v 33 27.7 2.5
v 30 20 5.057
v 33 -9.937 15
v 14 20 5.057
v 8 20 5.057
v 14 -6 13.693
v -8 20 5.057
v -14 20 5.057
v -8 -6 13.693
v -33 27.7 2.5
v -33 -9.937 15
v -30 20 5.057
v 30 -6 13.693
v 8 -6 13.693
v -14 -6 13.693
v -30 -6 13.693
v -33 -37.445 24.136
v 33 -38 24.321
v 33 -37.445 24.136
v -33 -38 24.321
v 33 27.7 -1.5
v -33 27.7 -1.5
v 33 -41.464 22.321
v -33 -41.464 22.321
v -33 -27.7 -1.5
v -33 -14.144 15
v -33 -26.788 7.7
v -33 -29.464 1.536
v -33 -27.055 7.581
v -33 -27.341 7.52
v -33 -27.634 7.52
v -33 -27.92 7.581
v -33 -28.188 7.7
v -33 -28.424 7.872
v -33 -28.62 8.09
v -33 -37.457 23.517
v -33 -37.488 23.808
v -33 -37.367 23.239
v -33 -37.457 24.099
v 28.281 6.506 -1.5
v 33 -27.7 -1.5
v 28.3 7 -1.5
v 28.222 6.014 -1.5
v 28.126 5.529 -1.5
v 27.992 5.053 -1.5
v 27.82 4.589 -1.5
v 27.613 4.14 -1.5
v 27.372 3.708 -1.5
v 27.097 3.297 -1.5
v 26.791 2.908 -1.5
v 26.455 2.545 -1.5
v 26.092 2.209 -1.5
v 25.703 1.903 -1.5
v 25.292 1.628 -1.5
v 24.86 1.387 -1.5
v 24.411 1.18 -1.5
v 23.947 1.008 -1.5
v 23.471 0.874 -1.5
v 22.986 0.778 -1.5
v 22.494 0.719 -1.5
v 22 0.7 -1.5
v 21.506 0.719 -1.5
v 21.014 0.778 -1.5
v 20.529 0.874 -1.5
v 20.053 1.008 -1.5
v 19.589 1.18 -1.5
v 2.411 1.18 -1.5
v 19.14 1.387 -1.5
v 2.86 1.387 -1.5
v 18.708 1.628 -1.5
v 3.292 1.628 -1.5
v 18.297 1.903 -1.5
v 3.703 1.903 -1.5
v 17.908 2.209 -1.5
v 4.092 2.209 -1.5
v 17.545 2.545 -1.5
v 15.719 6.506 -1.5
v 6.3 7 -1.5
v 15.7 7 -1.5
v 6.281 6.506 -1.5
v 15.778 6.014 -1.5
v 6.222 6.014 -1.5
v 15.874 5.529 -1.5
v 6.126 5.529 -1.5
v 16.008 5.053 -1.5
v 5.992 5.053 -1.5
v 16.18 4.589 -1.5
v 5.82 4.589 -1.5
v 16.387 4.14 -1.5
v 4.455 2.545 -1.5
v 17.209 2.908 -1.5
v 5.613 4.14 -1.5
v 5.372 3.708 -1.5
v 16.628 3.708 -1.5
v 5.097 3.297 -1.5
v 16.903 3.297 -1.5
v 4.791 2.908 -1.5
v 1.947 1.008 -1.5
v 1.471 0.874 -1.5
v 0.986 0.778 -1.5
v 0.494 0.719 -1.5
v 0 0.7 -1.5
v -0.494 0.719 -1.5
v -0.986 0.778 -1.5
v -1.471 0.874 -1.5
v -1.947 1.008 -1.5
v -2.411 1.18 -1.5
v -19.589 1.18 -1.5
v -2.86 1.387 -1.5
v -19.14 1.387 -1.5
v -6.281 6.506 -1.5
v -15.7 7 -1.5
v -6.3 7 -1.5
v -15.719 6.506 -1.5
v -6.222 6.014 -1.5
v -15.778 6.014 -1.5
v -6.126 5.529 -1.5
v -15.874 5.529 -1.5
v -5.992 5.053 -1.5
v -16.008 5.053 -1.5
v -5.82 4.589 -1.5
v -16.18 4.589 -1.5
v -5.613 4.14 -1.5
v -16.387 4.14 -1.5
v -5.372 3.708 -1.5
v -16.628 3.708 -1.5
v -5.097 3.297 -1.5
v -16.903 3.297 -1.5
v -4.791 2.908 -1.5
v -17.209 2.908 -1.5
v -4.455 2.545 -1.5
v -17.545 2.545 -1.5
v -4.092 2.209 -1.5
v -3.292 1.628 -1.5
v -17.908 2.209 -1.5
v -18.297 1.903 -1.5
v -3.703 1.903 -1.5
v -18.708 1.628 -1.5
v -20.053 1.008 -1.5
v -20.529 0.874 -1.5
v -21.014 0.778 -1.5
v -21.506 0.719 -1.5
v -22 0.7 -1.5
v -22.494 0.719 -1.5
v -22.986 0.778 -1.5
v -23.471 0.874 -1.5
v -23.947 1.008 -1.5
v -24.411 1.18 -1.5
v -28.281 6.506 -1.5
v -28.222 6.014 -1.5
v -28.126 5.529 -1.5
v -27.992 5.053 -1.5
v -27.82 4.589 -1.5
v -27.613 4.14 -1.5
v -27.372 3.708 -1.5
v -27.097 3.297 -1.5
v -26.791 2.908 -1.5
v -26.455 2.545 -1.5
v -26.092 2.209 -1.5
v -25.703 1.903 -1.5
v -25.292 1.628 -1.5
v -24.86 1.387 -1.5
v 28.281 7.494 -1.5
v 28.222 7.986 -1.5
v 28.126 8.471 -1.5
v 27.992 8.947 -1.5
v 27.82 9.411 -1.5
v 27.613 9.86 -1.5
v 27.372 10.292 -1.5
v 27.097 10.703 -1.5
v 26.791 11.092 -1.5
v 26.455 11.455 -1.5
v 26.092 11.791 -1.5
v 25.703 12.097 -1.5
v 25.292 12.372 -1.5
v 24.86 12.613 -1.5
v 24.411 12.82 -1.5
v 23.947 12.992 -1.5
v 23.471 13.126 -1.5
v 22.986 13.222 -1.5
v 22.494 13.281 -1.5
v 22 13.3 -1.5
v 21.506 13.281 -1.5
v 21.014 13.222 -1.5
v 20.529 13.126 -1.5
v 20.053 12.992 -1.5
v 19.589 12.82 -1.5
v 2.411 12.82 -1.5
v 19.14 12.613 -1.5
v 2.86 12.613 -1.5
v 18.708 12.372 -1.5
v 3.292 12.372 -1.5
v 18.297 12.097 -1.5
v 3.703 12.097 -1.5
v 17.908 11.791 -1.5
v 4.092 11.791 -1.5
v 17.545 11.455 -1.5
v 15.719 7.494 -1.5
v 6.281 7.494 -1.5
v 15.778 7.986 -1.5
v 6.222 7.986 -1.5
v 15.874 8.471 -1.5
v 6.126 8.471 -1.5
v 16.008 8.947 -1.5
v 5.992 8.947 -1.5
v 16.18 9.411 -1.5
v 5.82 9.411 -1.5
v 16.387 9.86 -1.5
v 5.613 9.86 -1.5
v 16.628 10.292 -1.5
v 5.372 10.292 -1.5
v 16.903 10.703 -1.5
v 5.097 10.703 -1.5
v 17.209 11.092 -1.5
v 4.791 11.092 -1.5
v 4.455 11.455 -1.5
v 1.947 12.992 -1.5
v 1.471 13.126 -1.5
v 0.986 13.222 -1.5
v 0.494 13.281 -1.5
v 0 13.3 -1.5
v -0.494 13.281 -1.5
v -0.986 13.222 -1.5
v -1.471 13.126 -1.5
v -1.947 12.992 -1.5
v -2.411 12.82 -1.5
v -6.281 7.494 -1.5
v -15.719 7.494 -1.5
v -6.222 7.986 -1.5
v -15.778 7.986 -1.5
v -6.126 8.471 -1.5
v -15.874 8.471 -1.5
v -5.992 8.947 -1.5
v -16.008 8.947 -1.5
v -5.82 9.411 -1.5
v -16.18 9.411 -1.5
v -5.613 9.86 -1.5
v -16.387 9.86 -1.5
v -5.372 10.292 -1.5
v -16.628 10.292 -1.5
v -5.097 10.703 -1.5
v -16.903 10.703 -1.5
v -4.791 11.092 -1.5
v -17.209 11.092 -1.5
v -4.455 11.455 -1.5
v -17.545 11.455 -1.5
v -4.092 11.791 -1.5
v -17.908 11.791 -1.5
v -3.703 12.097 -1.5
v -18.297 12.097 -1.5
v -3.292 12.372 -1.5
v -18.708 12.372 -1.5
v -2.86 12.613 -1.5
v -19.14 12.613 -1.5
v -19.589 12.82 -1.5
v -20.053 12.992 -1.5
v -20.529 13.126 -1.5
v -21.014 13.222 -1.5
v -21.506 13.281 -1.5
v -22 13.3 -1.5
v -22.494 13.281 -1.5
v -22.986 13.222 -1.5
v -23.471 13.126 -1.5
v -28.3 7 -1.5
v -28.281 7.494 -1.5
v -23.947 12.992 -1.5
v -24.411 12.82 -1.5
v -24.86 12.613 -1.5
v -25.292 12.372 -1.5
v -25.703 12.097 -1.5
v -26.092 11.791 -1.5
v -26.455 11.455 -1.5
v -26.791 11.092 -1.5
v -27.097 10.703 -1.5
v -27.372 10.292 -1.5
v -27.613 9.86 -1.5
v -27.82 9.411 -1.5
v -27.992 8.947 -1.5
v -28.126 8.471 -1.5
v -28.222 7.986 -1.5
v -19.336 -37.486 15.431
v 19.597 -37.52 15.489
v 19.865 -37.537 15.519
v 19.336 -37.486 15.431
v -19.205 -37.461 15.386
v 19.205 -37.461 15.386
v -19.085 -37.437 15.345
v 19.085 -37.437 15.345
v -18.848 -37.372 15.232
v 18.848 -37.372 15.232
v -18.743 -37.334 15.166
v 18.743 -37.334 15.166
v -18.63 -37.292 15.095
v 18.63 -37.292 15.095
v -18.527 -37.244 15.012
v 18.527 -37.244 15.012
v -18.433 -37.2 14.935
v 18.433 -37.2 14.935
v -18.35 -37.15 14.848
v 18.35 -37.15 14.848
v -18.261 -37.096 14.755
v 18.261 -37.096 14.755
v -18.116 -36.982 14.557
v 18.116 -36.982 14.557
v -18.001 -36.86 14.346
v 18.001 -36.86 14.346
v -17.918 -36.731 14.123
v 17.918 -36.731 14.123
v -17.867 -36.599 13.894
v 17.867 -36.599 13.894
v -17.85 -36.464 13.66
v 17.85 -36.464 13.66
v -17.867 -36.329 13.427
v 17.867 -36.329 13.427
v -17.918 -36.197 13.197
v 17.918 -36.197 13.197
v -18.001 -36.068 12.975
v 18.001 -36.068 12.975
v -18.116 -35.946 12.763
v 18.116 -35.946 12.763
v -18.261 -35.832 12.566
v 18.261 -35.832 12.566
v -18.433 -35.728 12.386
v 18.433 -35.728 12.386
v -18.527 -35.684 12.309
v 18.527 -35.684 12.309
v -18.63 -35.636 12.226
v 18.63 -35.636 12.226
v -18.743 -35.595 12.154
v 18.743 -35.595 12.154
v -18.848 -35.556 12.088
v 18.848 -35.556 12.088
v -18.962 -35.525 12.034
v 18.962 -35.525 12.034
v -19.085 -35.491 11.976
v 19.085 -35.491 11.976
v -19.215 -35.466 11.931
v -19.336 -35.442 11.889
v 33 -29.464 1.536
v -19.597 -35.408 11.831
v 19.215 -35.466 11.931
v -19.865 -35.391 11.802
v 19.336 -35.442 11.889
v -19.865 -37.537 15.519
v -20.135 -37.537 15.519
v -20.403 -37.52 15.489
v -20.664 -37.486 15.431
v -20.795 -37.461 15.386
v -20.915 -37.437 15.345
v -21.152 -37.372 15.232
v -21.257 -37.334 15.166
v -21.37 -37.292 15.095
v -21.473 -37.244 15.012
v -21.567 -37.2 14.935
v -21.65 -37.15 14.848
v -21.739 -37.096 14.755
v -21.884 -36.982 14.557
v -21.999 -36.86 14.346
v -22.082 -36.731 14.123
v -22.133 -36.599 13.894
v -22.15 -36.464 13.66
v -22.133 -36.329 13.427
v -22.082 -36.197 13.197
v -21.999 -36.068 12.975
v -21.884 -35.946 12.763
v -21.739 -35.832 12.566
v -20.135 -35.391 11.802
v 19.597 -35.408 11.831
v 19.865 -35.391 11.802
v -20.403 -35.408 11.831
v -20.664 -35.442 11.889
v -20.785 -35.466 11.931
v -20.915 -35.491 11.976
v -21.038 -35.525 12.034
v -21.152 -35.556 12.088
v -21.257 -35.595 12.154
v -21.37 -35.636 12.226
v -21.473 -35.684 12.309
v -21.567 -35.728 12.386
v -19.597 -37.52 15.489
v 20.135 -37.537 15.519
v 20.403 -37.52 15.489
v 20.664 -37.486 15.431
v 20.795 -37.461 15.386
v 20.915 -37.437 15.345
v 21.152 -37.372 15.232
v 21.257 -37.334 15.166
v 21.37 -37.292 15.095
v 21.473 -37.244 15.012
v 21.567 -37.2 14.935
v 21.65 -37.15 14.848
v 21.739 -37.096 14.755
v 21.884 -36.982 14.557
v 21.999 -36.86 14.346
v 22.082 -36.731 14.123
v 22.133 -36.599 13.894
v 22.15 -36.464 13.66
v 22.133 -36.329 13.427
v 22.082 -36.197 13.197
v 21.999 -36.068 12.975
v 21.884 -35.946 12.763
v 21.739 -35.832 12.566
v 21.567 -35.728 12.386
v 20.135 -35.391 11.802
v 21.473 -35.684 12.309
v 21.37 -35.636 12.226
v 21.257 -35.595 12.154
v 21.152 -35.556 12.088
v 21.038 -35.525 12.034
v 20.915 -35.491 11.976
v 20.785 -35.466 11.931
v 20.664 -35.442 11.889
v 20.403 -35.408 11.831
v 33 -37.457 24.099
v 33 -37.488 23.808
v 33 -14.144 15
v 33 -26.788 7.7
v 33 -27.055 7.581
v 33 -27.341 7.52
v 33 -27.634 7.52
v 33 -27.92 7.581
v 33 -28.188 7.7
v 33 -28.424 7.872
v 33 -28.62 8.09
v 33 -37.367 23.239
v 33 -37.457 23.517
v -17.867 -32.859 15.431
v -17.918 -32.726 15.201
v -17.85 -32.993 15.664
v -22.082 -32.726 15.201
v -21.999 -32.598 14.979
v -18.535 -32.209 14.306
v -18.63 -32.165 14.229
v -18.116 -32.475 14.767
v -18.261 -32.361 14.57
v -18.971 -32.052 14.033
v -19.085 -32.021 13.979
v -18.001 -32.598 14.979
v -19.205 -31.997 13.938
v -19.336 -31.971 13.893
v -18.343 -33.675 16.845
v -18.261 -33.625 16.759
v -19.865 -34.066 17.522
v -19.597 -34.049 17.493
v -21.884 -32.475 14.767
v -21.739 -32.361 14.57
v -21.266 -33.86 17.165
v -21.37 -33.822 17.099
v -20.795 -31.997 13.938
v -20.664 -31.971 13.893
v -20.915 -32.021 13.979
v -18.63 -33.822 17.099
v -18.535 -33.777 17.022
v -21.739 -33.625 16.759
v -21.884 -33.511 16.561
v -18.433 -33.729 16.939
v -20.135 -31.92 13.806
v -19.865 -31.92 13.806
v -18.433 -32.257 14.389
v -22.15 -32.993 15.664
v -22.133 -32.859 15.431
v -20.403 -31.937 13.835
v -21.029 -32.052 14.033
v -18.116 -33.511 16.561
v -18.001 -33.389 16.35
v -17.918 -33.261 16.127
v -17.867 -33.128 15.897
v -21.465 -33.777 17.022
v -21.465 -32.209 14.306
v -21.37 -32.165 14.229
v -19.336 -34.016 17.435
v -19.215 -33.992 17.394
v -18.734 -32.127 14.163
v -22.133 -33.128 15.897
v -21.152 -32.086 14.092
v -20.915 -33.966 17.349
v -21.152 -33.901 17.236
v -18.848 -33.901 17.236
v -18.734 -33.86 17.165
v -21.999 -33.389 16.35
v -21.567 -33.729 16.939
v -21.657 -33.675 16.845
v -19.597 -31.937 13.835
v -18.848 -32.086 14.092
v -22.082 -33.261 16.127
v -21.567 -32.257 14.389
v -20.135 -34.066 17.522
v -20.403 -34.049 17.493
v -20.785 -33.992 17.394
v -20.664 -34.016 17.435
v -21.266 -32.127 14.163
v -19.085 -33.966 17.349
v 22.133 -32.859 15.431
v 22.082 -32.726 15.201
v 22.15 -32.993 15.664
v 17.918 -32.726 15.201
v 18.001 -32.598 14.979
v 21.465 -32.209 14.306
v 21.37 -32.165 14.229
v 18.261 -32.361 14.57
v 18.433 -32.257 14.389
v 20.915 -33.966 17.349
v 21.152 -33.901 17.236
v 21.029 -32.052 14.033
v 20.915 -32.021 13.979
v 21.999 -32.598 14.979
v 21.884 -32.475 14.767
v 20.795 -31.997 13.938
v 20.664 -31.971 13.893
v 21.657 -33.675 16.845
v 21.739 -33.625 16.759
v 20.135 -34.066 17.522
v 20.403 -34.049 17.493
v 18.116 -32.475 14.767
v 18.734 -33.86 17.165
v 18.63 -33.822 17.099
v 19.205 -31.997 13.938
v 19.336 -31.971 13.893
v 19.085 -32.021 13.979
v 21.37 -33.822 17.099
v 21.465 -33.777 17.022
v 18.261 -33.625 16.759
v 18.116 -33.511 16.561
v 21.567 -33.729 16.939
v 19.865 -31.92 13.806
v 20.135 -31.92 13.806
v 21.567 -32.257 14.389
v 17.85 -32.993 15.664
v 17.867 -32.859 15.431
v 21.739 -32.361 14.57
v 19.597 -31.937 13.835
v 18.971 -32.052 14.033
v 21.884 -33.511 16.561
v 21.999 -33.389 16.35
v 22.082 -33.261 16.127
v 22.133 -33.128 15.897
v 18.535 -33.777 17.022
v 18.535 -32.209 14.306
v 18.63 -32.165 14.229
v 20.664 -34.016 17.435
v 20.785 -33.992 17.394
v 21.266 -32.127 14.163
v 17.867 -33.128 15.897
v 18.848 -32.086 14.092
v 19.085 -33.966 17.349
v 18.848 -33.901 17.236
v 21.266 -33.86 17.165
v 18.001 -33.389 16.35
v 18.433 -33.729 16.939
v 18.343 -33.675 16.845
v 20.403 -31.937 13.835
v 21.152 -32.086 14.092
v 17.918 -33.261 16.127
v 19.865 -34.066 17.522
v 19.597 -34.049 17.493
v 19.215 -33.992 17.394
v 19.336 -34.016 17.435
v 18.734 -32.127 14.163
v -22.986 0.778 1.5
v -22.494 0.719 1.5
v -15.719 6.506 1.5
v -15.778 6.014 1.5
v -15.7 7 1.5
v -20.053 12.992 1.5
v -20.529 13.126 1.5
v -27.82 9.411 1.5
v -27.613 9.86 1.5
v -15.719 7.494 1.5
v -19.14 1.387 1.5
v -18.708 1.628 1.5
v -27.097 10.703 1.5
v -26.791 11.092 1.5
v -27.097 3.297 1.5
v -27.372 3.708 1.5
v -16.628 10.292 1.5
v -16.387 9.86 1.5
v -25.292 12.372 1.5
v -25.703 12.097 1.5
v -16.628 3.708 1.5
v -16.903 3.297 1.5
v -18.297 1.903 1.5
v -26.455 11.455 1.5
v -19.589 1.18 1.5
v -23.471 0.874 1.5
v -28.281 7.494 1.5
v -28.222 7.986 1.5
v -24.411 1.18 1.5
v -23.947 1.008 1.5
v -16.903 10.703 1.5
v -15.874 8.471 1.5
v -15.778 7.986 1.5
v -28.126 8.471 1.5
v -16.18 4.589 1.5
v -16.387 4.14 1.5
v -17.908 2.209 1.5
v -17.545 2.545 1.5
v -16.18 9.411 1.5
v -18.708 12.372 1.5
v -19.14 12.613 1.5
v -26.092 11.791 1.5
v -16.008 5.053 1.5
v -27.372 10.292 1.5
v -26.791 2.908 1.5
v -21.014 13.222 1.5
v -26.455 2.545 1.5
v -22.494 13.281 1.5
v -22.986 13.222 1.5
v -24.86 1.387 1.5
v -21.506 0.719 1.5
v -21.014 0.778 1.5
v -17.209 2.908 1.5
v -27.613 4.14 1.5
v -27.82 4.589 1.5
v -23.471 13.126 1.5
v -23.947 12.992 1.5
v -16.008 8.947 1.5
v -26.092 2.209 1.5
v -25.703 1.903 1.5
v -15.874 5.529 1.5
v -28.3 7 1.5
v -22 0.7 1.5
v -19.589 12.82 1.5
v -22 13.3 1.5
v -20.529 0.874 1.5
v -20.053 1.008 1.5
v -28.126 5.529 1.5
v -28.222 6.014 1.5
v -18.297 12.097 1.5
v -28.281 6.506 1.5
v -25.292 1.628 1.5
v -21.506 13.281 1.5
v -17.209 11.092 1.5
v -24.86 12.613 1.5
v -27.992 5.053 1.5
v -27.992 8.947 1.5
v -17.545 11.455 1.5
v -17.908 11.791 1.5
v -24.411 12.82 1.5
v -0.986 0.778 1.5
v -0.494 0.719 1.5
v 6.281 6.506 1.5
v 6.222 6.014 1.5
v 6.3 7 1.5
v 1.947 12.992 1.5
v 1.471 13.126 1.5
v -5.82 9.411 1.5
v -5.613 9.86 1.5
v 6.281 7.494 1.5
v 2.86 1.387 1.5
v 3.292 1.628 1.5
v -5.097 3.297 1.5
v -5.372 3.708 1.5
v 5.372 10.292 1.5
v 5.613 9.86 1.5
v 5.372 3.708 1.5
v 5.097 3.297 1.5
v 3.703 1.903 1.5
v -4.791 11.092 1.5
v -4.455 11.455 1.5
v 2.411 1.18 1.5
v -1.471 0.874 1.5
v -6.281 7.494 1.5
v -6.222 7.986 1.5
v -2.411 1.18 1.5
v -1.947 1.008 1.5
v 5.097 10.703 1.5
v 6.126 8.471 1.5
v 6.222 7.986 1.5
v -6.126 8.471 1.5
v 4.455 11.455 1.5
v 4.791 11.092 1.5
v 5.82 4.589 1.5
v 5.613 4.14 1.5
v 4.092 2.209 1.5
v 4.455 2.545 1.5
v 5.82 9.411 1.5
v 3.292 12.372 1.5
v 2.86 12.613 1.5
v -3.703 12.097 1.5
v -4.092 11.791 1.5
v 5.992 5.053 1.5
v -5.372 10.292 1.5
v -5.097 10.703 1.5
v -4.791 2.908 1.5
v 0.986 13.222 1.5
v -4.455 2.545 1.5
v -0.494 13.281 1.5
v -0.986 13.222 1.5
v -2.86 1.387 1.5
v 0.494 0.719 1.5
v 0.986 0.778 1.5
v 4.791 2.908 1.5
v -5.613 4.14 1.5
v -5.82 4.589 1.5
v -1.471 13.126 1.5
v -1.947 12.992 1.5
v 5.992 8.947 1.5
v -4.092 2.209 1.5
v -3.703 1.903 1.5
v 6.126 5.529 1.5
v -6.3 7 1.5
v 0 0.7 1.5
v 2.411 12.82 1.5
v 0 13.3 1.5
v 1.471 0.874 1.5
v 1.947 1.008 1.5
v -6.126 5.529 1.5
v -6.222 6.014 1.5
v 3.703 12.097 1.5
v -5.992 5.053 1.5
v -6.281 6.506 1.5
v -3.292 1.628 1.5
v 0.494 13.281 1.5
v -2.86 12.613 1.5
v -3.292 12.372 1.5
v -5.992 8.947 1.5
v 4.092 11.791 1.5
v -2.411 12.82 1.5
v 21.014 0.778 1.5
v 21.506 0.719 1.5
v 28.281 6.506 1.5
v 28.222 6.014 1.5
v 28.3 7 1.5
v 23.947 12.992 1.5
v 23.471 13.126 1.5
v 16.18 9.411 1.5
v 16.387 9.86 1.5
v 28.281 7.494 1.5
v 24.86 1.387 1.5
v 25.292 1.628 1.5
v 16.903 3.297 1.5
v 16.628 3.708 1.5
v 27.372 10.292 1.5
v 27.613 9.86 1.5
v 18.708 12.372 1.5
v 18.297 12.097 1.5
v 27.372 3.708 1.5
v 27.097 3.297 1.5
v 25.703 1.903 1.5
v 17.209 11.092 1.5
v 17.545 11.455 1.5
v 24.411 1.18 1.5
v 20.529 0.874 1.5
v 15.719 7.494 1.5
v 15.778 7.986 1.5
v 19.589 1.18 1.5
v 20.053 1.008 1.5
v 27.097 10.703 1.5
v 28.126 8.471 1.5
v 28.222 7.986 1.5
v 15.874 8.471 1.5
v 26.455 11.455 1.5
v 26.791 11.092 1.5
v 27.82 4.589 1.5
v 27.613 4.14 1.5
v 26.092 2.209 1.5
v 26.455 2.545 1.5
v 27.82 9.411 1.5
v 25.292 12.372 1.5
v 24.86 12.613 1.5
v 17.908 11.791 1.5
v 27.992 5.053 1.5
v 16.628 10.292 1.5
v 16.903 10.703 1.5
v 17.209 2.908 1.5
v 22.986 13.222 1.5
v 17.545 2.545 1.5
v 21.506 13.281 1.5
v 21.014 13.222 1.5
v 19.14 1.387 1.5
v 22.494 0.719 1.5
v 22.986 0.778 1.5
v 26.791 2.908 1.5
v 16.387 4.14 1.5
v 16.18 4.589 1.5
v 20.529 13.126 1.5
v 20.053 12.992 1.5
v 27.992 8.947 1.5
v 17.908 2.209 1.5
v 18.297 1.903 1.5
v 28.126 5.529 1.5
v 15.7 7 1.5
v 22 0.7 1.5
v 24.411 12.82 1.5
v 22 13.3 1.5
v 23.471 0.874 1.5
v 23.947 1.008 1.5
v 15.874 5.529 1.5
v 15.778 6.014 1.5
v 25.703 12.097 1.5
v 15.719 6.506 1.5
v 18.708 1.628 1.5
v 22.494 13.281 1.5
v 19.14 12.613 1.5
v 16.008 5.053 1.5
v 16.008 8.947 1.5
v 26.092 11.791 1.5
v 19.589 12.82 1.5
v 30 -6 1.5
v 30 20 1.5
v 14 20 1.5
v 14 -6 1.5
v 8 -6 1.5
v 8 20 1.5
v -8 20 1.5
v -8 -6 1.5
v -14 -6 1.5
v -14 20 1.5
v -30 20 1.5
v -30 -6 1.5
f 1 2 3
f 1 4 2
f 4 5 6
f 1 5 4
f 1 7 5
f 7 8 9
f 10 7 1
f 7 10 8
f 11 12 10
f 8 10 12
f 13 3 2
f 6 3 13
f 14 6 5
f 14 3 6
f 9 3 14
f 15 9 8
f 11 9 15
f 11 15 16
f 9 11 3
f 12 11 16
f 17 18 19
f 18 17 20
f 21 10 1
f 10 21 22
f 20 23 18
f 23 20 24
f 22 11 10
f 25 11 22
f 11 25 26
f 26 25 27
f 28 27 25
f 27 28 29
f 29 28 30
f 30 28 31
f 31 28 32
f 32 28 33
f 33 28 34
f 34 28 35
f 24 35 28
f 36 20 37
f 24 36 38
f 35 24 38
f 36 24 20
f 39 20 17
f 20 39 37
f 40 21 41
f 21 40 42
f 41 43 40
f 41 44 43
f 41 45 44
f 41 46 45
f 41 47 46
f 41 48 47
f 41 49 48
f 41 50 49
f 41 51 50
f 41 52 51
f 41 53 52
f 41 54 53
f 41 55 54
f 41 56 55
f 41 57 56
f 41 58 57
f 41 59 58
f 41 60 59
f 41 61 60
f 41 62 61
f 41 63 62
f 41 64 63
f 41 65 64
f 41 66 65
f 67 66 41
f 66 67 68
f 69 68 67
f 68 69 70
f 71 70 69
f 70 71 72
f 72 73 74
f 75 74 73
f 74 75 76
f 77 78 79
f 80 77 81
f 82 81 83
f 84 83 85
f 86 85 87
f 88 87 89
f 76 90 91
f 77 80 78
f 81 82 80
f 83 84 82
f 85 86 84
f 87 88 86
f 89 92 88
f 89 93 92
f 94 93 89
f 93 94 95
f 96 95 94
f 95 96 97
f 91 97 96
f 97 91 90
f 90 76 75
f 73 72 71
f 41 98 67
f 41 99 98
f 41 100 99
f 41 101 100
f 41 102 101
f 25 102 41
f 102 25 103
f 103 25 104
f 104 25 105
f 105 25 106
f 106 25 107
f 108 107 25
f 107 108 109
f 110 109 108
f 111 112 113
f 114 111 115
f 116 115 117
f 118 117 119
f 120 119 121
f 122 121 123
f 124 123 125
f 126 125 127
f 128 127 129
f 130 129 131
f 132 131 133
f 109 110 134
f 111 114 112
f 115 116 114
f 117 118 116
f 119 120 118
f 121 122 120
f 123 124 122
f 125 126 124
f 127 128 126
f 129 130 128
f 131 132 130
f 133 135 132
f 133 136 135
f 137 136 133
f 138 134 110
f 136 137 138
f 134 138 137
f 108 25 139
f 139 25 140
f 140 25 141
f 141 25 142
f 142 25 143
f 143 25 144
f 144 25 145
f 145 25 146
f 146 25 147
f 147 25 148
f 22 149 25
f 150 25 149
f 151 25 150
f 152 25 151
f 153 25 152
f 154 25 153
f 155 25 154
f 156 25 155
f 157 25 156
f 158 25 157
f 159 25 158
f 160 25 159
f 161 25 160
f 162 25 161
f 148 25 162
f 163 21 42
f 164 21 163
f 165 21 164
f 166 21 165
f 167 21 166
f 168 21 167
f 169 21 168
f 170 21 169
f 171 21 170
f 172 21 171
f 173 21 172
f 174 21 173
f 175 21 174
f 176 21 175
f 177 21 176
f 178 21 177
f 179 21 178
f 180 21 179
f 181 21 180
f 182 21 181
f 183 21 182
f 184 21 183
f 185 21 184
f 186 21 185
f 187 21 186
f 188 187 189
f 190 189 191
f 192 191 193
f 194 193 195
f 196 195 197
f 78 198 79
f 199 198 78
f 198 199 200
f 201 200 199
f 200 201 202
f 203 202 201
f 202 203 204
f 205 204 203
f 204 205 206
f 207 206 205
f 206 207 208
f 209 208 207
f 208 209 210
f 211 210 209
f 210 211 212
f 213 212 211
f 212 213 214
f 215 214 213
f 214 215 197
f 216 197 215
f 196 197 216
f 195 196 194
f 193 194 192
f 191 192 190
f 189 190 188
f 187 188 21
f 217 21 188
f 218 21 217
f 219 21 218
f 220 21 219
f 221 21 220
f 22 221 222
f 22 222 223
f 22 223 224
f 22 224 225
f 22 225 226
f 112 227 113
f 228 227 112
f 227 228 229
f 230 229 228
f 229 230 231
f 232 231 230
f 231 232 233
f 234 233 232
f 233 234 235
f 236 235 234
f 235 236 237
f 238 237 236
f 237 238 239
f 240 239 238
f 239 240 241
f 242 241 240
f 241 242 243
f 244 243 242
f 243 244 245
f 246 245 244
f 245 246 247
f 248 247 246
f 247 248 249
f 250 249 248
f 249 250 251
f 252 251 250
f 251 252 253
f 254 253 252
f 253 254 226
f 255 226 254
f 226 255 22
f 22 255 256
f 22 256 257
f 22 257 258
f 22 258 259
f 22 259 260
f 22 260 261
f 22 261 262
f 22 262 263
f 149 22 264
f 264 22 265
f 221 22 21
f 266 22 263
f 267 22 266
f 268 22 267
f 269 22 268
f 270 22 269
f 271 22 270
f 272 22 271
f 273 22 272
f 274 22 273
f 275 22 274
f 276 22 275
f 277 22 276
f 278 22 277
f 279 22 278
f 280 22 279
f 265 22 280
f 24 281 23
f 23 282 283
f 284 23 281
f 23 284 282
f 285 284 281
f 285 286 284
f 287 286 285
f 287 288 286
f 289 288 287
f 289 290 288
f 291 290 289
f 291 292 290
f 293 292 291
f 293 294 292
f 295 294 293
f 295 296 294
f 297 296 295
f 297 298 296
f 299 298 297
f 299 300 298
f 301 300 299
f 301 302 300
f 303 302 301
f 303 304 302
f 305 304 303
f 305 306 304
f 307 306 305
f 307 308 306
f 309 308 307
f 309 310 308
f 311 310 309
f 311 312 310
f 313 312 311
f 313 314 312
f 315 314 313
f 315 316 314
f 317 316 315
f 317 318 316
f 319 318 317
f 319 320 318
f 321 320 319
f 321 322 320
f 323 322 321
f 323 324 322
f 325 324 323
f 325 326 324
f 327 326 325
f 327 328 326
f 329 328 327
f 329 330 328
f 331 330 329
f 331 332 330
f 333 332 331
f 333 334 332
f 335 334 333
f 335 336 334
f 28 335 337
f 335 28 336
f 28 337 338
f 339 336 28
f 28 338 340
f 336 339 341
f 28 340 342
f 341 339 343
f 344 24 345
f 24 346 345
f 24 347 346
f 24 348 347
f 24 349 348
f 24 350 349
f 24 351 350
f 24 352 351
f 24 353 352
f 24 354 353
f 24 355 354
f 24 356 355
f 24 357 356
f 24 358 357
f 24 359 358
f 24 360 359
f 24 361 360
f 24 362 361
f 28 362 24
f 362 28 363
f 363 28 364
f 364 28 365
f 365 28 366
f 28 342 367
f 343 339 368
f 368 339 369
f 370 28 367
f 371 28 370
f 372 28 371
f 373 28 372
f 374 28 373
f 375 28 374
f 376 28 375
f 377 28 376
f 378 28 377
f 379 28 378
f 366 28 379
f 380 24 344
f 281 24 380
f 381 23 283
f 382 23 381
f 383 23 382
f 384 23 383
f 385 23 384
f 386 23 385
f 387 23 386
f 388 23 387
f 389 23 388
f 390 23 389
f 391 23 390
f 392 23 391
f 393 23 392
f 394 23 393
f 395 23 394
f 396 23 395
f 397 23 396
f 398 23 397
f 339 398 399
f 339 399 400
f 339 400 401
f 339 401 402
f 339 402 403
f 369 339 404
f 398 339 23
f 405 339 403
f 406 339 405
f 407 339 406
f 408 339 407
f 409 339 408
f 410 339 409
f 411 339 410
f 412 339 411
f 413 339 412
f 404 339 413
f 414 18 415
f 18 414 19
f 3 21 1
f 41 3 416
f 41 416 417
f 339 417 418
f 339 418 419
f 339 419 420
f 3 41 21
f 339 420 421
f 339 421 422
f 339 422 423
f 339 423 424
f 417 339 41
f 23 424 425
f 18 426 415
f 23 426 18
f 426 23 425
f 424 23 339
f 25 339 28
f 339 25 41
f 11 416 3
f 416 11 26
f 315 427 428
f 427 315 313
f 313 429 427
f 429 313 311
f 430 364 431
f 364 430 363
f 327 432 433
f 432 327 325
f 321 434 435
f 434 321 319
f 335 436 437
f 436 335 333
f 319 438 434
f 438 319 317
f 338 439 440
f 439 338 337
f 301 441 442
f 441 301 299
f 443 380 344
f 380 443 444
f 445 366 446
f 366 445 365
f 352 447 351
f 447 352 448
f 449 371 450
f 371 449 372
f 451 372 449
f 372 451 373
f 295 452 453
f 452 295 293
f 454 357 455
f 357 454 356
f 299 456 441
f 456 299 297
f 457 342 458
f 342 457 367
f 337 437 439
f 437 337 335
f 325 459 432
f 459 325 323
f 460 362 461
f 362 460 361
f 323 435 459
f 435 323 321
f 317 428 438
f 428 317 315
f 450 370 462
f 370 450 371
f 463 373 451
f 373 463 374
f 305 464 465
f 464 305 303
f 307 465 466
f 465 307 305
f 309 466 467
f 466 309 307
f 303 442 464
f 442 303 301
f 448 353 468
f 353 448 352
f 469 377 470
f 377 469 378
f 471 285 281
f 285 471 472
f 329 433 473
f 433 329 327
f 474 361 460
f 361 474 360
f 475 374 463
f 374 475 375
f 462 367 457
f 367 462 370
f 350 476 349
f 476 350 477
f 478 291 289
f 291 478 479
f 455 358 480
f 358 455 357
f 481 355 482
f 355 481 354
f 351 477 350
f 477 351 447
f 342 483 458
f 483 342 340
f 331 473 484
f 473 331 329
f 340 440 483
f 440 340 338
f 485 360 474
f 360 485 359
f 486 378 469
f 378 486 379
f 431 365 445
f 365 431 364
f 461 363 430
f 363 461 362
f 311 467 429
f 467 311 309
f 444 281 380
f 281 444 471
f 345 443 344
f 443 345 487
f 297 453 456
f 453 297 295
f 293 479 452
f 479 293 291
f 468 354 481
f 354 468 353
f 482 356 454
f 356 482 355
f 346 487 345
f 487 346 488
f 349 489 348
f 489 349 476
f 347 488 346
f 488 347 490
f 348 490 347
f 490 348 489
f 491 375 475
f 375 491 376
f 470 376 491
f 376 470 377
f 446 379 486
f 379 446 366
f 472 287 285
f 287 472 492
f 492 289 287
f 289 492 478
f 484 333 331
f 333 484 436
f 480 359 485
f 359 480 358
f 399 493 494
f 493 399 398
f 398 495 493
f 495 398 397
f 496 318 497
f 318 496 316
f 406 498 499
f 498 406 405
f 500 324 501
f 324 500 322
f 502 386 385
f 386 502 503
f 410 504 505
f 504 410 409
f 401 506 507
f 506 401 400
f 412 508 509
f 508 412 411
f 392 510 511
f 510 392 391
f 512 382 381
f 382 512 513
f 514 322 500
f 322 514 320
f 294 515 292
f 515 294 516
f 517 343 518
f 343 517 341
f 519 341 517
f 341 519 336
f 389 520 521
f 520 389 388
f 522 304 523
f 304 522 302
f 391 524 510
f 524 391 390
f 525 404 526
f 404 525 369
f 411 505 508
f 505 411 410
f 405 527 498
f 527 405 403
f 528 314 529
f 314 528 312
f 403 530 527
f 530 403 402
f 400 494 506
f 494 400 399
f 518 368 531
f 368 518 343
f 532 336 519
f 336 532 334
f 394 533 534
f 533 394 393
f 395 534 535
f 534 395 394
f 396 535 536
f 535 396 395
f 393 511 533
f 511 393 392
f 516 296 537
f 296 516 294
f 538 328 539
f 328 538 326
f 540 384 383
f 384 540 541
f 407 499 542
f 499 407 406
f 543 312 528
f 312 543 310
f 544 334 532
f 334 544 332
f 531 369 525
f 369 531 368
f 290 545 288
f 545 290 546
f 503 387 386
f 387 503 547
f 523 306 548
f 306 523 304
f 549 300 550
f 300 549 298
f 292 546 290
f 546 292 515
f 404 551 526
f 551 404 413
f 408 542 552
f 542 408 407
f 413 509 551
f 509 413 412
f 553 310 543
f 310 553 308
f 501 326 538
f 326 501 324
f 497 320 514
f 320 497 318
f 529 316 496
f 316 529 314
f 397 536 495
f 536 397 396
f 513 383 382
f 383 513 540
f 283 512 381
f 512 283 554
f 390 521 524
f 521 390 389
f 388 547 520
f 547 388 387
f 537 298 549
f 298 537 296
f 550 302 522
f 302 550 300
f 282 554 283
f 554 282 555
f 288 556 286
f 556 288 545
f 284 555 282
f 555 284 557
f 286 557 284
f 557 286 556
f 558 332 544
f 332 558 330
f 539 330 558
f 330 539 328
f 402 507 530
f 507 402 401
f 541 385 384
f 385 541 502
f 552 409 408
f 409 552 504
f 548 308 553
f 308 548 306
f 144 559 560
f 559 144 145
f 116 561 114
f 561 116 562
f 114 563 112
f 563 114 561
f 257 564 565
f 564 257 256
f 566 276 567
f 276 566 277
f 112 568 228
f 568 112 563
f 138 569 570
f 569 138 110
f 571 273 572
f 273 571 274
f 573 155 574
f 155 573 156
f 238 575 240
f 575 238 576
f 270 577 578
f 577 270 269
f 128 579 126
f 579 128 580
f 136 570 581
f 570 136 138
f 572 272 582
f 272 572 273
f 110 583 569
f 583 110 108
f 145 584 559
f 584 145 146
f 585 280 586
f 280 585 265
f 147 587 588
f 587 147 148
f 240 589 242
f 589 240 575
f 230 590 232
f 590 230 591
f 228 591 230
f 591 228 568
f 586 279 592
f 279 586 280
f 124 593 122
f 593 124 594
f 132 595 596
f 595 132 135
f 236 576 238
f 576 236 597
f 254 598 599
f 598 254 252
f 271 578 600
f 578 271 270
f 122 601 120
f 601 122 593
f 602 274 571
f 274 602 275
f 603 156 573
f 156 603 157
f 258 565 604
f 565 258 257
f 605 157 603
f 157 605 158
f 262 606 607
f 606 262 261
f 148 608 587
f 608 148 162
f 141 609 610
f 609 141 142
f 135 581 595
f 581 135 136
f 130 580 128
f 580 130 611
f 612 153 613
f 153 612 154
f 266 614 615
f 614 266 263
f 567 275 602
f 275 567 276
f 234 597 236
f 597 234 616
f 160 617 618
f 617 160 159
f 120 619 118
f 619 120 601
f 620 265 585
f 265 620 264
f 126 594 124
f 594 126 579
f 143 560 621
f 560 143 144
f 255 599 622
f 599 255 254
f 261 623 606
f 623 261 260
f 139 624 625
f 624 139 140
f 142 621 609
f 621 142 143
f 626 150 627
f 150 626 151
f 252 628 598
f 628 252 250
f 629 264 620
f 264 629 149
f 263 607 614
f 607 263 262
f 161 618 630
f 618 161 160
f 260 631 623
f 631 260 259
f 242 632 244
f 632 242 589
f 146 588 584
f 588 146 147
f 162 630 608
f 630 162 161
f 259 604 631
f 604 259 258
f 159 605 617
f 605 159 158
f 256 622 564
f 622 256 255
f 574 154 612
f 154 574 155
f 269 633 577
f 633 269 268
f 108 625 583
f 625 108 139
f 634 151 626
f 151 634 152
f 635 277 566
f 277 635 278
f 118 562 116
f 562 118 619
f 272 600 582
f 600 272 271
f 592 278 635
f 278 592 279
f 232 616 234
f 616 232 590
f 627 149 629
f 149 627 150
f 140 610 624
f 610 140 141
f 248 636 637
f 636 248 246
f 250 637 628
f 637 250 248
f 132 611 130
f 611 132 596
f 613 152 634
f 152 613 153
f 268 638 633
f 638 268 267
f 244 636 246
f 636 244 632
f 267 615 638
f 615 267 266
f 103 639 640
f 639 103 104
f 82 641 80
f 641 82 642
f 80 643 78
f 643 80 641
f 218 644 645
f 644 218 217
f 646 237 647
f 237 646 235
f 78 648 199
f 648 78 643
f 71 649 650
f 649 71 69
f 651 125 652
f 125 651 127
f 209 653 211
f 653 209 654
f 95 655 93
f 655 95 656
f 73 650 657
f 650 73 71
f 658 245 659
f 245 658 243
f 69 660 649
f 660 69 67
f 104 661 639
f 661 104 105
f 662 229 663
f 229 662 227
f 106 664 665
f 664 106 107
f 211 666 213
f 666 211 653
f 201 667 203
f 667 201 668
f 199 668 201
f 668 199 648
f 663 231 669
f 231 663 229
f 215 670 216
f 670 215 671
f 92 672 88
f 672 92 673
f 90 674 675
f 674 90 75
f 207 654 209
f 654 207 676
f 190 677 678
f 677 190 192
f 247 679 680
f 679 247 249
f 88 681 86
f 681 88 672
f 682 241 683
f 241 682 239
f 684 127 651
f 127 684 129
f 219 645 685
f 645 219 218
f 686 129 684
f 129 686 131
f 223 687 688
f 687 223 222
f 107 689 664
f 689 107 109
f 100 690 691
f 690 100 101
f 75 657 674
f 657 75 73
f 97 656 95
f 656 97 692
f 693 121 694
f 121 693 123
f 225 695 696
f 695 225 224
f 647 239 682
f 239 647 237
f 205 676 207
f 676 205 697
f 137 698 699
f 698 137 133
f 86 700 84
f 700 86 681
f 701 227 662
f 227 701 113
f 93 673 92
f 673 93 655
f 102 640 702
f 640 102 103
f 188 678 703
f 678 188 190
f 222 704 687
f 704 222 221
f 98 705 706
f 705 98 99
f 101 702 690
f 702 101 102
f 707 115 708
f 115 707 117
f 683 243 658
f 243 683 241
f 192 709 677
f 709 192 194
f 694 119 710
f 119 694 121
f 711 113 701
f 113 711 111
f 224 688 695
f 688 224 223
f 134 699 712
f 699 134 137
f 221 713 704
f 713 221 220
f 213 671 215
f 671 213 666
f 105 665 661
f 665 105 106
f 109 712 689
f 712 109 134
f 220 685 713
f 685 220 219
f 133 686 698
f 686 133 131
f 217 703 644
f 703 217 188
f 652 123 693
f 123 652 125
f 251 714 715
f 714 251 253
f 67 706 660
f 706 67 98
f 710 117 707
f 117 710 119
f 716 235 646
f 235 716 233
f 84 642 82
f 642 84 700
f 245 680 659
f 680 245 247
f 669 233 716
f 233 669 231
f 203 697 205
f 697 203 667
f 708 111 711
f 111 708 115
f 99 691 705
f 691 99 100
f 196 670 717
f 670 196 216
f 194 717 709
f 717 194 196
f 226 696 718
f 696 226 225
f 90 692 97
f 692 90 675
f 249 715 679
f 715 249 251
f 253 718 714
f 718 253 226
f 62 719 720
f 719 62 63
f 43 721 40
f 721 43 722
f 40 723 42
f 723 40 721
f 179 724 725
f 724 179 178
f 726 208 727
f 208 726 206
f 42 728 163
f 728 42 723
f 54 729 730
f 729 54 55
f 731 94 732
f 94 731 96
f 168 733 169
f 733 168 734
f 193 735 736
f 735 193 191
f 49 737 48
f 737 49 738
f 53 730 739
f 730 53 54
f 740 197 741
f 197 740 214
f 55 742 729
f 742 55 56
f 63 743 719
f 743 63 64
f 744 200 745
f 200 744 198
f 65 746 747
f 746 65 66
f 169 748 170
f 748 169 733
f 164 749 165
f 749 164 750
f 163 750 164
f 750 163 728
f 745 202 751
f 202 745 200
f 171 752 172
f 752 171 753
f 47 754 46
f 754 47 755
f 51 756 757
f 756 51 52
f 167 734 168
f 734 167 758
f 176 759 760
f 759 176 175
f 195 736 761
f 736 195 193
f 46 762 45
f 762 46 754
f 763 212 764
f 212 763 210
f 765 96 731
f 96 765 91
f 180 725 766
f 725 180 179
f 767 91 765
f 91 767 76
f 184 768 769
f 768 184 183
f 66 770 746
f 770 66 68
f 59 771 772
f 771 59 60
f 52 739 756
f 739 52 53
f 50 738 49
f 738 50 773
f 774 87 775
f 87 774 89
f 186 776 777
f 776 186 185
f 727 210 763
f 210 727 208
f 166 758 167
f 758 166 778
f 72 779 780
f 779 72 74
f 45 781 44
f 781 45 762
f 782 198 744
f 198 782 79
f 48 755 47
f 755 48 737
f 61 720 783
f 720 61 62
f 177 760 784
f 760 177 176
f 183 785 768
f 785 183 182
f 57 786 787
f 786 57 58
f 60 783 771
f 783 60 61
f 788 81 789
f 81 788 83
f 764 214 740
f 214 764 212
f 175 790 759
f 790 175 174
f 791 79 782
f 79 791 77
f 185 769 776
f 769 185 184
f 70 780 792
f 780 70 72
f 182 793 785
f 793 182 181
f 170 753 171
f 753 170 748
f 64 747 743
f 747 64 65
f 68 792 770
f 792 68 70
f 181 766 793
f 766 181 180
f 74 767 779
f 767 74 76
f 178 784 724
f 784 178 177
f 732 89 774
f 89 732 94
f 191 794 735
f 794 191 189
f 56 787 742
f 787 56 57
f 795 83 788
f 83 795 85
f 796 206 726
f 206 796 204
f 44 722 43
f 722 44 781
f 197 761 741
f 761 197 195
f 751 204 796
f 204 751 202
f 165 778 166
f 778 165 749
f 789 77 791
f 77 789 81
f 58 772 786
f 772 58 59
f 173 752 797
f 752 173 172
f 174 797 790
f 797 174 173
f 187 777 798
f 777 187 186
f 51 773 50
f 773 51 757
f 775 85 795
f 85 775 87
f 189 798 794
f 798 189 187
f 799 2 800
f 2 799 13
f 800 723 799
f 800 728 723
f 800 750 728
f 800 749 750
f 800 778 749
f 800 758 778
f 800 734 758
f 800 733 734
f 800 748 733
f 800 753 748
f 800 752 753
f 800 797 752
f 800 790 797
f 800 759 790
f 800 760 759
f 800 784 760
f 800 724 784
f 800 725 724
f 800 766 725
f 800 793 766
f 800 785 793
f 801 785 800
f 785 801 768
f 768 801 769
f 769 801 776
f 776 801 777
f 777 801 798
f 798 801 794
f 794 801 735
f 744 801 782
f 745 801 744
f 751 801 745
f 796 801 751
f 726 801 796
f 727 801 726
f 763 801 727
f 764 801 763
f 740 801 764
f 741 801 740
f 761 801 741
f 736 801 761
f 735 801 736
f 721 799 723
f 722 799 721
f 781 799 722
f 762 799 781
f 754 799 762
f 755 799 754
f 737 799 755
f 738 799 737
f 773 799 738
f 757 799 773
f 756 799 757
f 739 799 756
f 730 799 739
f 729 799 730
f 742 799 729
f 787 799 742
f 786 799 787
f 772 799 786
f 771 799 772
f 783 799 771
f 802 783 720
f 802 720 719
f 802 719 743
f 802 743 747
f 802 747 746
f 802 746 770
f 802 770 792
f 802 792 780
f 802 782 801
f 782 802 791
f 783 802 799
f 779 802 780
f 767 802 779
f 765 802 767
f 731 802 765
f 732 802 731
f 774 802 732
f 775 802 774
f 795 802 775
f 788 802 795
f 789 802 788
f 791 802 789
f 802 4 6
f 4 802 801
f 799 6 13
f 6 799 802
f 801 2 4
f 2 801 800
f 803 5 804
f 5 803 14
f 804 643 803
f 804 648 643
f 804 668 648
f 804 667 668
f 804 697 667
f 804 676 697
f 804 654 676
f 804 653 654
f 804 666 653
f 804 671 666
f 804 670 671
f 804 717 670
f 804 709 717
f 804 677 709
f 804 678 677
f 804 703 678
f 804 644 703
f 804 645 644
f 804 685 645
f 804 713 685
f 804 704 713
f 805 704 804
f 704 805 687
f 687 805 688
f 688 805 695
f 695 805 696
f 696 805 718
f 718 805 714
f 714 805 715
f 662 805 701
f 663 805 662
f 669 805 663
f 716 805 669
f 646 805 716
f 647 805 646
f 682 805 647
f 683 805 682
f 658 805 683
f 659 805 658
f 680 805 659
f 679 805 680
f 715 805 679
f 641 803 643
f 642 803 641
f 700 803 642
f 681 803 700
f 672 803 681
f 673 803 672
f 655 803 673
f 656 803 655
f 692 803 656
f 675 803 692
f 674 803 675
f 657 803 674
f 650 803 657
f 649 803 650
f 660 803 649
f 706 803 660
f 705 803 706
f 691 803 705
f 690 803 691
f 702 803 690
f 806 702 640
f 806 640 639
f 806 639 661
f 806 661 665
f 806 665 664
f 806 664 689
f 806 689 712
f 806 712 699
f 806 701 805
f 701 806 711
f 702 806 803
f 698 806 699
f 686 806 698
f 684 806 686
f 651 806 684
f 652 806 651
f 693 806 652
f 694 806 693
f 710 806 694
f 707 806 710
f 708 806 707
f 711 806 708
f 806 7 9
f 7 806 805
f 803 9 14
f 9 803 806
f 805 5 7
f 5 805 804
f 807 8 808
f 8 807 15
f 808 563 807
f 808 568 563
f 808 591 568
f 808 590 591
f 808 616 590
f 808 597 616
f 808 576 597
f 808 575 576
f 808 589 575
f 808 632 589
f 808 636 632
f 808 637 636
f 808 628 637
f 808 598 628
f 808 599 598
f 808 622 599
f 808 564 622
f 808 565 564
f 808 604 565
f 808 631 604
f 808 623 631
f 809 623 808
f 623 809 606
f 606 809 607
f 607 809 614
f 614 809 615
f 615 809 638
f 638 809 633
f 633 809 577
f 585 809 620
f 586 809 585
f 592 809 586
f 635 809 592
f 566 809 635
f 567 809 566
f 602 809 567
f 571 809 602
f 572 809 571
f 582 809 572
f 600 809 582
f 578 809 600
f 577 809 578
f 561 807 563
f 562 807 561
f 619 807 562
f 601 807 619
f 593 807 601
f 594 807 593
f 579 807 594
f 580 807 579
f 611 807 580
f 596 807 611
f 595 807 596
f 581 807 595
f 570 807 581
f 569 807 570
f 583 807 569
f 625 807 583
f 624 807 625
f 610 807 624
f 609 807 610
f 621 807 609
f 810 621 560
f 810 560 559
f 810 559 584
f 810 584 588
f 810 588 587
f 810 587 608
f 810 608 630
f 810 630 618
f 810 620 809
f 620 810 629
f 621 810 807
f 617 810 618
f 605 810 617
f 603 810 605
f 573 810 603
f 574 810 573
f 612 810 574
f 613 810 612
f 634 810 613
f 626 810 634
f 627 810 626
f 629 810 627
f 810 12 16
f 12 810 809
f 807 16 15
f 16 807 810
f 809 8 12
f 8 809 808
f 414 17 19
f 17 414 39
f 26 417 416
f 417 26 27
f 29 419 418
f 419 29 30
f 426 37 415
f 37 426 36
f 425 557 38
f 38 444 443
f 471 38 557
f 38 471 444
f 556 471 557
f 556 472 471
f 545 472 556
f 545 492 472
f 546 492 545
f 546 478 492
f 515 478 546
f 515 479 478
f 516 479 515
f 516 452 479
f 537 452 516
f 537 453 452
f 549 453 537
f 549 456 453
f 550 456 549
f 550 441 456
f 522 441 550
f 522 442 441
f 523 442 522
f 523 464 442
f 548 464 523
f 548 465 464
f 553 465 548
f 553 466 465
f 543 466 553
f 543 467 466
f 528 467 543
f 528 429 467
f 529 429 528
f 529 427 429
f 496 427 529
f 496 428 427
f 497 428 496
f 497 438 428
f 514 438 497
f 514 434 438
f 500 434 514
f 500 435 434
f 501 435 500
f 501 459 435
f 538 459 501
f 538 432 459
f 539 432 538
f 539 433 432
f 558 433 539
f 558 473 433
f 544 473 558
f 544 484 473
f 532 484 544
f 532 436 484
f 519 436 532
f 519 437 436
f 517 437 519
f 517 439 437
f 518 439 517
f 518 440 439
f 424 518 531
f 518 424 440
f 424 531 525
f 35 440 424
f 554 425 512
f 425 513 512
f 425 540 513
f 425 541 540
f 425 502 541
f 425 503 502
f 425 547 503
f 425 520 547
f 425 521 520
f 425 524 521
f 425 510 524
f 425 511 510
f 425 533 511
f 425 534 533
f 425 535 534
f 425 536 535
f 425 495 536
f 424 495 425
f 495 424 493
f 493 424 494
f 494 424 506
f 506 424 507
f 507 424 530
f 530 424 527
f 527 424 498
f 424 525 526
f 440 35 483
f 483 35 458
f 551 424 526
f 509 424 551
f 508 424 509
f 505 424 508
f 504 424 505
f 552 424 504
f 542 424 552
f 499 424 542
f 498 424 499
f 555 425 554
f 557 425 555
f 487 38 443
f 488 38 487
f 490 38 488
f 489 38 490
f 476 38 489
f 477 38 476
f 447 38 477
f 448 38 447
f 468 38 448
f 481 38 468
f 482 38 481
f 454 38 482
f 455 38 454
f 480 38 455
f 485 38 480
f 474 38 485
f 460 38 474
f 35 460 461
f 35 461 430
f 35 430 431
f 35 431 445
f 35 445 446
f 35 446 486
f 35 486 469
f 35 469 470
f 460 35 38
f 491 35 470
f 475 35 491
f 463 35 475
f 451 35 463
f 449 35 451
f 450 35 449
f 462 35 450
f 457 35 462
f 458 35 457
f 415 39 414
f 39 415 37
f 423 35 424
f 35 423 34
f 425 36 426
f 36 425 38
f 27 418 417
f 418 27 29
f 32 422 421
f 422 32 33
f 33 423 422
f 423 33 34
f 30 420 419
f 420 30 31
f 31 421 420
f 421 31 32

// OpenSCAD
// file: configuration.scad
// OD = outside diameter, corner to corner.
m3_nut_od = 6.1;
m3_nut_radius = (m3_nut_od+0.2)/2;

m4_nut_od = 8.1;
m4_nut_radius = (m4_nut_od+0.2)/2;

// Major diameter of metric 3mm thread.
m3_major = 2.85;
m3_radius = m3_major/2;
m3_open_radius = 3.2/2;

m4_major = 3.85;
m4_radius = m4_major/2;
m4_open_radius = 4.3/2;

m8_major = 7.85;
m8_radius = m8_major/2;
m8_open_radius = 8.3/2;

// NEMA17 stepper motors.
motor_shaft_diameter = 5;
motor_shaft_radius = (motor_shaft_diameter+0.3)/2;

// Frame brackets.
thickness = 3.6;

tower_radius = 185;
tower_side = tower_radius*1.73205;
tower_h = tower_radius*1.5;
tower_height = 1000;
bearing_spacing = 39.8;
horizontal_beam_radius = (tower_radius+28.8)/2;
horizontal_beam_length = horizontal_beam_radius * 3.464101615138 - (41.35*2);

color_a = "GreenYellow";
color_b = "black";
color_c = "";
color_d = "Silver";
// file: ../components/2020.scad
module outer_shape(h=10){
	hull(){
		translate([8.6,8.6,-h/2]) cylinder(r=1.4,h=h,$fn=30);
		translate([8.6,-8.6,-h/2]) cylinder(r=1.4,h=h,$fn=30);
		translate([-8.6,8.6,-h/2]) cylinder(r=1.4,h=h,$fn=30);
		translate([-8.6,-8.6,-h/2]) cylinder(r=1.4,h=h,$fn=30);
	}
}

module extrusion(h=10){
	difference(){
		union(){
			difference(){
				outer_shape(h=h);
				cube([17.2,17.2,h+0.1],center=true);
				cube([20.1,6,h+0.1],center=true);
				cube([6,20.1,h+0.1],center=true);

				translate([-9.9,0,0])cube([0.5,6.8,h+0.1],center=true);
				translate([9.9,0,0])cube([0.5,6.8,h+0.1],center=true);
				translate([0,-9.9,0])cube([6.8,0.5,h+0.1],center=true);
				translate([0,9.9,0])cube([6.8,0.5,h+0.1],center=true);
			}
			rotate([0,0,45]) cube([26,1.5,h],center=true);
			rotate([0,0,-45]) cube([26,1.5,h],center=true);
			intersection(){
				union(){
					translate([8,8,0]) cube([4,4,h],center=true);
					translate([8,-8,0]) cube([4,4,h],center=true);
					translate([-8,8,0]) cube([4,4,h],center=true);
					translate([-8,-8,0]) cube([4,4,h],center=true);
				}
				outer_shape();
			}
			cube([9,9,h],center=true);
		}
		translate([0,0,-h/2-1]) cylinder(h+2,2.5,2.5,$fn=30);
	}


}

module beam(h=10,clearance = 0){
	if(clearance > 0){
		outer_shape(h=h);
	} else {
		extrusion(h);
	}
}
// main file
include <../components/2020.scad>
include <configuration.scad>

through_hole_radius = 6.3;

base_height = 3;
stength_height = 4;
max_height = 15;

module switch_mount(){
	difference(){
		hull(){
			translate([0,0,-(stength_height/2-base_height/2)]) cube([66,55.4,stength_height],center=true);
			translate([0,28,-7]) rotate([30,0,0]) translate([0,2,-8]) cube([66,4,24],center=true);
		}

		translate([0,0,-20-max_height]) cube([80,55,40],center=true);

		translate([-20,28,-7]) rotate([30,0,0]) translate([0,2,-10]) rotate([90,0,0]) cylinder(r=m4_open_radius,h=100,center=true, $fn=50);
		translate([20,28,-7]) rotate([30,0,0]) translate([0,2,-10]) rotate([90,0,0]) cylinder(r=m4_open_radius,h=100,center=true, $fn=50);

		translate([-22,-7,0]) cylinder(r=through_hole_radius,h=50,center=true,$fn=80);
		translate([0,-7,0]) cylinder(r=through_hole_radius,h=50,center=true,$fn=80);
		translate([22,-7,0]) cylinder(r=through_hole_radius,h=50,center=true,$fn=80);

		translate([22,-7,-16.5]) cube([16,26,30],center=true);
		translate([0,-7,-16.5]) cube([16,26,30],center=true);
		translate([-22,-7,-16.5]) cube([16,26,30],center=true);

		translate([0,28,-7]) rotate([30,0,0]) translate([0,-10,-10]) rotate([0,90,0]) beam(h=290,clearance=1);
	}
	%translate([0,28,-7]) rotate([30,0,0]) translate([0,-10,-10]) rotate([0,90,0]) beam(h=290,clearance=0);
}


rotate([180,0,0]) switch_mount();
//switch_mount();
